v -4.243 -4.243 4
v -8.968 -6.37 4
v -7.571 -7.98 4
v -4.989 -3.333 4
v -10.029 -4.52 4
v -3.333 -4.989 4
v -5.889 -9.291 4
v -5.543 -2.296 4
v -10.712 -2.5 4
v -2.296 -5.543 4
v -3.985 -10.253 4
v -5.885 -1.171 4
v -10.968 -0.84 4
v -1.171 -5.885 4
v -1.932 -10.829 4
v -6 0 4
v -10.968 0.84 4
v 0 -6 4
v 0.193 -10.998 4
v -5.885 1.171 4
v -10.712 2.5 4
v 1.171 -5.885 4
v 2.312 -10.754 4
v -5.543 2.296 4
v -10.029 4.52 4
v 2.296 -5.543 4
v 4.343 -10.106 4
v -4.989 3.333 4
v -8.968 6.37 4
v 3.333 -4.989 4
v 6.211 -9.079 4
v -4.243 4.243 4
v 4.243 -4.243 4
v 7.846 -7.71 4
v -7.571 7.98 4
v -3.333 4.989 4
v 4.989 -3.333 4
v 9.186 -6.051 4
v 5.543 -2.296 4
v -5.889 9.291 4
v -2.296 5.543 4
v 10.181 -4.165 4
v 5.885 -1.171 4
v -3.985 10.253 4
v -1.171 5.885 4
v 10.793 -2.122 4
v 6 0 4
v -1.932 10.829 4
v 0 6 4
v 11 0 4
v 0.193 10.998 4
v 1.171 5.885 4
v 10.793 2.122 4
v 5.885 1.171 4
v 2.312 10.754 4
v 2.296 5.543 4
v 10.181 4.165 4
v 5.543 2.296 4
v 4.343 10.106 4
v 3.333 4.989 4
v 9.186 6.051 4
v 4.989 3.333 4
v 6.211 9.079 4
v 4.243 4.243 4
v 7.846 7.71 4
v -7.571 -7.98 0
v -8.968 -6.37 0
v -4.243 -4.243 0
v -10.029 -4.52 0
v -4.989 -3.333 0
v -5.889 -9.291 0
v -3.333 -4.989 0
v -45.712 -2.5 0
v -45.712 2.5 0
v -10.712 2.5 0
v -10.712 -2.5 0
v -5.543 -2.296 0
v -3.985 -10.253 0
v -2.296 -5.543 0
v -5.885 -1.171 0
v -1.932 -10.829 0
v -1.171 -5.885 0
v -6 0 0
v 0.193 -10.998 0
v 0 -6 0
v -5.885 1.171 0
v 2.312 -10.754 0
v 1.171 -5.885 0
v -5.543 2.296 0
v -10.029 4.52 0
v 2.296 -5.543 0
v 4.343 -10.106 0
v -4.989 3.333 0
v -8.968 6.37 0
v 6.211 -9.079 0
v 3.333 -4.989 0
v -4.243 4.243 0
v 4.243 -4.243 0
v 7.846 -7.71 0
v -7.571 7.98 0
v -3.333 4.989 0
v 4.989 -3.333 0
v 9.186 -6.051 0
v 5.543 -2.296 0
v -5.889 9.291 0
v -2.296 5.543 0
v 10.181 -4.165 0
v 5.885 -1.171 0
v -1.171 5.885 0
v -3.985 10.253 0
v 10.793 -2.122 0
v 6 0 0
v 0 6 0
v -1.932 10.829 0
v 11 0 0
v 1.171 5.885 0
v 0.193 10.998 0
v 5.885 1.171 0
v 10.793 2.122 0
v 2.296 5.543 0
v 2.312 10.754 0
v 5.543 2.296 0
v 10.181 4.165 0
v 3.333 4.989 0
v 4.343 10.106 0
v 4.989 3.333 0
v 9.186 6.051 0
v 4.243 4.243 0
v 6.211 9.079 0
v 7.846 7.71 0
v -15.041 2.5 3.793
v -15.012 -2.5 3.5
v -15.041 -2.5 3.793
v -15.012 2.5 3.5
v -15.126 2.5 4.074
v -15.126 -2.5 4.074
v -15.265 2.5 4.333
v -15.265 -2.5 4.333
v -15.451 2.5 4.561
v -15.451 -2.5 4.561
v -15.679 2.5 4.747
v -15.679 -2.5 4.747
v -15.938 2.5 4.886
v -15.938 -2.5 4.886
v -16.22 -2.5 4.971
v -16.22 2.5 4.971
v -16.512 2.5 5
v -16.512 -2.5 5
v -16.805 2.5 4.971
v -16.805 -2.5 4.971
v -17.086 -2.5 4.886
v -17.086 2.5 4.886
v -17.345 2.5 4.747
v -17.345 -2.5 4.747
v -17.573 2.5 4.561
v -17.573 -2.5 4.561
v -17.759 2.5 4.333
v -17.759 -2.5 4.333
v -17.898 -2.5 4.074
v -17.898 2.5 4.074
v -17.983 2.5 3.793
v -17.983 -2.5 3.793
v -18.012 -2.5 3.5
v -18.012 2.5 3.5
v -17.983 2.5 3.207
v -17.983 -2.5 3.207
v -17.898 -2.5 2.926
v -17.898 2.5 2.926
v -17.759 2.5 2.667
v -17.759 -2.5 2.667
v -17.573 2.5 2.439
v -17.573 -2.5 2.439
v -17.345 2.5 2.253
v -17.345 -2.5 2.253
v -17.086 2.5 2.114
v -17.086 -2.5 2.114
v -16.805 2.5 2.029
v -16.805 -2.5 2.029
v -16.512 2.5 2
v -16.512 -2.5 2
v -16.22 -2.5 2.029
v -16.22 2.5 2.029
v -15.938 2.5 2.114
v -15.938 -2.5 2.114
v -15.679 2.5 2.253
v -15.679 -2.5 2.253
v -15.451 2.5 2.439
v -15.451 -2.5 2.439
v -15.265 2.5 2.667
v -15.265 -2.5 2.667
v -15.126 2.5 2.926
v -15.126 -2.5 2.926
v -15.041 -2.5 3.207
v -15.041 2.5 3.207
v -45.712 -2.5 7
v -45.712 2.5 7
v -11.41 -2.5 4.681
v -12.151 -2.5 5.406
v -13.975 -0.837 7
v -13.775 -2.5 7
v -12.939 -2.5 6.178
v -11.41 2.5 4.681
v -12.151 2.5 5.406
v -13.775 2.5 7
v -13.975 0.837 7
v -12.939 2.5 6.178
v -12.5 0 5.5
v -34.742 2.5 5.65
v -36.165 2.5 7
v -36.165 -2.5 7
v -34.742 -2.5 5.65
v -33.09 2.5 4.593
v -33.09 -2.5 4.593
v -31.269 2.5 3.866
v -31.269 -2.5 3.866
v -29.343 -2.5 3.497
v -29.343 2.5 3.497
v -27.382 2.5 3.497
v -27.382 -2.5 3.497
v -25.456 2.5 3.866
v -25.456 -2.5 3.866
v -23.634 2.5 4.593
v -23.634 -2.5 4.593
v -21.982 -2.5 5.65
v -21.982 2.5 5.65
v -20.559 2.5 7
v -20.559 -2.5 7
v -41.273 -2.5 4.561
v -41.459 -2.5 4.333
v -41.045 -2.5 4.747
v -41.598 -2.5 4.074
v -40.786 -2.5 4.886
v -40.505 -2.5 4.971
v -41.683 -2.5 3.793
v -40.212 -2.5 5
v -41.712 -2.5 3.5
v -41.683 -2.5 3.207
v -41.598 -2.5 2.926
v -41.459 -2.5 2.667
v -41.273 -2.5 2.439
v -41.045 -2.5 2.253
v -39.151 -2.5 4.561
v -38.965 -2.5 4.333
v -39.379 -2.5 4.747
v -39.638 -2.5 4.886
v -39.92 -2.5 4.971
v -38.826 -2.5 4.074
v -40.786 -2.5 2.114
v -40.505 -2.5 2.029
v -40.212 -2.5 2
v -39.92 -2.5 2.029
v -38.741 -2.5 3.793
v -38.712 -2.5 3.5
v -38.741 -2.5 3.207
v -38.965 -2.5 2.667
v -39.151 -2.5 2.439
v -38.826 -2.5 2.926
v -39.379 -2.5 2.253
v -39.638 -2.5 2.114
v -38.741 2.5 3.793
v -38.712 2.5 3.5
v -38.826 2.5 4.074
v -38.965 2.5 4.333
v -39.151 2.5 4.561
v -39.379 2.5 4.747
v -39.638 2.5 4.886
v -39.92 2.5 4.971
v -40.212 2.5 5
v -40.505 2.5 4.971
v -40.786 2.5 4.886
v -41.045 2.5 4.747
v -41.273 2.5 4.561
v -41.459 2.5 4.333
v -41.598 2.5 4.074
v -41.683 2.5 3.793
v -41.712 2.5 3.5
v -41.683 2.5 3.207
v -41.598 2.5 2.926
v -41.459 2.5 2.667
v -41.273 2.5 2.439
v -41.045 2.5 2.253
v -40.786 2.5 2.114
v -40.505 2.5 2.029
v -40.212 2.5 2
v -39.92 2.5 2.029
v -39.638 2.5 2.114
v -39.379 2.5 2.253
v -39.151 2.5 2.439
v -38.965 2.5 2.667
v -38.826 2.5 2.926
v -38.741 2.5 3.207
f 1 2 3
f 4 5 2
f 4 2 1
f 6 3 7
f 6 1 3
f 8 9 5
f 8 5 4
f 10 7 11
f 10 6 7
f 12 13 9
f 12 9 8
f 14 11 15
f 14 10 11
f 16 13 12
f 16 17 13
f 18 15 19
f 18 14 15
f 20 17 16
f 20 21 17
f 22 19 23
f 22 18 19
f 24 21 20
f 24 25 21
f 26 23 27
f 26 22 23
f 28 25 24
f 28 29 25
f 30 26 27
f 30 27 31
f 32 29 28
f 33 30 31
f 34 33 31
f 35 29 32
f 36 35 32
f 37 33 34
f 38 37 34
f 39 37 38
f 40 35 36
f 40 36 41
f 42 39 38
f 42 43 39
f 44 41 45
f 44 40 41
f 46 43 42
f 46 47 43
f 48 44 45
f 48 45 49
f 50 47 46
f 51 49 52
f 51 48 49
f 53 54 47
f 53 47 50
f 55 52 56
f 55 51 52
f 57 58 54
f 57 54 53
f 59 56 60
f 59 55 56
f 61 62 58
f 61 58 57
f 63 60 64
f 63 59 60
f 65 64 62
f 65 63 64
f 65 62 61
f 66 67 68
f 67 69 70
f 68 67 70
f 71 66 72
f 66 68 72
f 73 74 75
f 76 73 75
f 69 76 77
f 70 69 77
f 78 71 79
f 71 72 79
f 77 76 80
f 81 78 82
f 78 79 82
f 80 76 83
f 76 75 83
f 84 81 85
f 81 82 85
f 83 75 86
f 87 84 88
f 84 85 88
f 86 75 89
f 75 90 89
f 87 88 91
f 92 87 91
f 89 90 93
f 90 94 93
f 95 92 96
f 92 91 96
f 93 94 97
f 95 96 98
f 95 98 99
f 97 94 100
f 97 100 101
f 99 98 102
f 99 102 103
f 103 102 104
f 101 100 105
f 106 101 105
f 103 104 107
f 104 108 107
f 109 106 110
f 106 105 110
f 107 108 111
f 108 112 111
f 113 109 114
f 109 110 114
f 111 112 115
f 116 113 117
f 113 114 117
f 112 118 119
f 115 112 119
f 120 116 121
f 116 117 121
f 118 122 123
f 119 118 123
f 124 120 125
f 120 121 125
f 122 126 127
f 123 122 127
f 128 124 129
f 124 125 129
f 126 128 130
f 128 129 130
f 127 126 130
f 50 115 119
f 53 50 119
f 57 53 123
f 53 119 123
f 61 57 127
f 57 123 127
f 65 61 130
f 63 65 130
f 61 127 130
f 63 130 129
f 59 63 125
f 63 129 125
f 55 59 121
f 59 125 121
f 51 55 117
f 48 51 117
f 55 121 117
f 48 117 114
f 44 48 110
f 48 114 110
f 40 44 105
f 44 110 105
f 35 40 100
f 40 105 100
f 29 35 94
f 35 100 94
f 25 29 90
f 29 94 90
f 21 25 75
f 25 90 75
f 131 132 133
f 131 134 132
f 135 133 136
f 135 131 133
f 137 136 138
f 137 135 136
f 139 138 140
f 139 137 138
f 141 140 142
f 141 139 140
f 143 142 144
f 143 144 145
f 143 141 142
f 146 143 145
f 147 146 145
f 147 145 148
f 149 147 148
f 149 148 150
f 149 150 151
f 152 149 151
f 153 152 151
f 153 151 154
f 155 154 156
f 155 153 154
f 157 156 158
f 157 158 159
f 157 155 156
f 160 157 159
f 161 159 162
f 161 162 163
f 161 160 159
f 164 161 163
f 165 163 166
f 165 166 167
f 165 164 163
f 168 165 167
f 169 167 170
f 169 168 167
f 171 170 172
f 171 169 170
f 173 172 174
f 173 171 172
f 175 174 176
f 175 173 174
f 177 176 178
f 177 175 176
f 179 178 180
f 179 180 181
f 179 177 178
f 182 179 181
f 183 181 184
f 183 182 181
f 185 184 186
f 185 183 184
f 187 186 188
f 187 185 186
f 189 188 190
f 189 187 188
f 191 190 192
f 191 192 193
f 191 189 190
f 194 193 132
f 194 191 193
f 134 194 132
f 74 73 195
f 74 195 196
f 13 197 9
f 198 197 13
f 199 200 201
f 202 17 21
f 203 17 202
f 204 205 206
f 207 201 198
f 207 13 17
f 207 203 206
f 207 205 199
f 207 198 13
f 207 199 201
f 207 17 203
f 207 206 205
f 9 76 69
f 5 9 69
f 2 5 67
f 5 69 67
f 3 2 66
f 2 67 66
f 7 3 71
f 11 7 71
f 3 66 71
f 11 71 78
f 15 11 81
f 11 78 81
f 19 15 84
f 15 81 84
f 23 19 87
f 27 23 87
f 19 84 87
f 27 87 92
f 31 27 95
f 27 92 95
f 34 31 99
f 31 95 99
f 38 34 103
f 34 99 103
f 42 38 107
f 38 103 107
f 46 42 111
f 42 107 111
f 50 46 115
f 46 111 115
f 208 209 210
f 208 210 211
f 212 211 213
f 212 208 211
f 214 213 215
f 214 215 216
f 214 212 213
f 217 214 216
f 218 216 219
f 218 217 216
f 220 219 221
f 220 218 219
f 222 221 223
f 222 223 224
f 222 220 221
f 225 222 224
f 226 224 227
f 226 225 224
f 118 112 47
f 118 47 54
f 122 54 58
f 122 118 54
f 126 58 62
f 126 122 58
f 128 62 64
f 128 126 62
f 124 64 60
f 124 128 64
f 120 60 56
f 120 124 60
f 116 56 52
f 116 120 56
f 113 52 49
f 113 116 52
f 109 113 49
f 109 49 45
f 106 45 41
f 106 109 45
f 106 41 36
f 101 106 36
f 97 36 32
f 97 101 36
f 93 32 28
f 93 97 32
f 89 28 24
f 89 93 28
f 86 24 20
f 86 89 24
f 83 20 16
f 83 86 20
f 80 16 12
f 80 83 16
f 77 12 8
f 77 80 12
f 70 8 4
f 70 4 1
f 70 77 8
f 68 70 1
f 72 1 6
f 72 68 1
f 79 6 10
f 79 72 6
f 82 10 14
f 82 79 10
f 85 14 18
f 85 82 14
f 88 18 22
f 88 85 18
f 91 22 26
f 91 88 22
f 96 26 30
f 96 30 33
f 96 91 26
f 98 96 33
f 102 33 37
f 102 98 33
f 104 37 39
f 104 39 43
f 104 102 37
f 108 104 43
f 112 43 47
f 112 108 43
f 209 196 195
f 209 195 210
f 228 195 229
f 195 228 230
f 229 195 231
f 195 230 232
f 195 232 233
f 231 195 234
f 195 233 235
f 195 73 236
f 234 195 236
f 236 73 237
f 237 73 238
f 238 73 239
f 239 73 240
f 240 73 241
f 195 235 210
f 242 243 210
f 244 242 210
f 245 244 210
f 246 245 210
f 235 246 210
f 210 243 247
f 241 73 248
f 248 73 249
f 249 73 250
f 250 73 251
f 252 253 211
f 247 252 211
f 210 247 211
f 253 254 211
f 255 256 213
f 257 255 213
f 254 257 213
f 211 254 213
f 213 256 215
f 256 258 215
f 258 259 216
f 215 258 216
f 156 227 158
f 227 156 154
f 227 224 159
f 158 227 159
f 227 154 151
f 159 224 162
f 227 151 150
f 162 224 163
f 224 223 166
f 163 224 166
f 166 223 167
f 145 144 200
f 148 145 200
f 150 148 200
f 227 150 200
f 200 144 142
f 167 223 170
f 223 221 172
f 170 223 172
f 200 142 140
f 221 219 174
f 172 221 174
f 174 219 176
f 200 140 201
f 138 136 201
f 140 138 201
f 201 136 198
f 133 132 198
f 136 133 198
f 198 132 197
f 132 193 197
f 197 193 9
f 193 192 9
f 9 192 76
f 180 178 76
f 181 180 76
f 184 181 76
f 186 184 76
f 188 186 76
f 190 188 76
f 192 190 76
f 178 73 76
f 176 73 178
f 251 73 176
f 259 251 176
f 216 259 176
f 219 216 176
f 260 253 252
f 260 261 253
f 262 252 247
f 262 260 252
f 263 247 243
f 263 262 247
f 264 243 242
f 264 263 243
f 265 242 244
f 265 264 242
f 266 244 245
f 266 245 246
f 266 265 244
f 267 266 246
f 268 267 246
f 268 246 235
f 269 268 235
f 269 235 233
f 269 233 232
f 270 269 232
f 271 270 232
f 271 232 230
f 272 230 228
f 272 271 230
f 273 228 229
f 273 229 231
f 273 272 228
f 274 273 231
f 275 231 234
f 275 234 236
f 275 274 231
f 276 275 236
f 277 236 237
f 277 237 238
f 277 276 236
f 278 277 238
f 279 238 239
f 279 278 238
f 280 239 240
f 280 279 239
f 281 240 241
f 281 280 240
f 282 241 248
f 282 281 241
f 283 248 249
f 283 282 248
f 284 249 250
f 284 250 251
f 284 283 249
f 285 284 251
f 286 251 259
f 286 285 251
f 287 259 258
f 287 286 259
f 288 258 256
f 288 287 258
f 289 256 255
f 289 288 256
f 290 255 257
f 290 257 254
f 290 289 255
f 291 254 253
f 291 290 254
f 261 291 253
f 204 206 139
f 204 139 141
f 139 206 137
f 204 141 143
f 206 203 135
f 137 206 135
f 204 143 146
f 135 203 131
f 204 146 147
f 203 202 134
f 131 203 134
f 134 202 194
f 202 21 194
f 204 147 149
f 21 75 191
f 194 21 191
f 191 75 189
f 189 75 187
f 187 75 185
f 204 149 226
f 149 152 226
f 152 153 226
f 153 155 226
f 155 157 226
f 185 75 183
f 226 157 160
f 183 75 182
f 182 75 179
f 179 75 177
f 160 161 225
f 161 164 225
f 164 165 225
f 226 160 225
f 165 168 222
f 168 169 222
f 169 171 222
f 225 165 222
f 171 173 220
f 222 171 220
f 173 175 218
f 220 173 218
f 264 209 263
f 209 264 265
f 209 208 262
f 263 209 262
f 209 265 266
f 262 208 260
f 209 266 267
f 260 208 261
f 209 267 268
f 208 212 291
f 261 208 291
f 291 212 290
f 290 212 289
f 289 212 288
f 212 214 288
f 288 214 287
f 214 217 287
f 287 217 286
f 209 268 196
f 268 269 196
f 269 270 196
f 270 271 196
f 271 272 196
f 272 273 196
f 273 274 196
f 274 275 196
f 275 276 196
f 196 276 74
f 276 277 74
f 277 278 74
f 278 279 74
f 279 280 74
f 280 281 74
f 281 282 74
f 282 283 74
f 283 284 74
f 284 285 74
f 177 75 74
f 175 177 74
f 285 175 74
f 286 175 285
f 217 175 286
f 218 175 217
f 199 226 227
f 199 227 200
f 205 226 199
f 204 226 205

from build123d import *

# Parameters (mm, degrees)
F0_R     = 6
F1_DEPTH = 4
F0_W     = 1.5
F0_H     = 5
F0_W_2   = 10.35
F0_W_3   = 4
F2_DEPTH = 7
F6_SIZE  = 2.99999


# Not quite as in the source:
# - a fillet or chamfer is up to 0.001 mm smaller than in the source, because OpenCascade refuses the exact size


with BuildPart() as f1:
    # F0 (on Top) → F1 (new body)
    with BuildSketch(Plane.XY):
        with BuildLine():
            ThreePointArc((-10.7121426428, -2.5), (1.258258902, -10.9277987049), (11, 0))
            ThreePointArc((11, 0), (1.258258902, 10.9277987049), (-10.7121426428, 2.5))
            ThreePointArc((-10.7121426428, 2.5), (-11, 0), (-10.7121426428, -2.5))
        make_face()
        Circle(F0_R, mode=Mode.SUBTRACT)
    extrude(amount=F1_DEPTH)

    # F0 (on Top) → F2 (join)
    with BuildSketch(Plane.XY):
        with BuildLine():
            ThreePointArc((-10.7121426428, -2.5), (-11, 0), (-10.7121426428, 2.5))
            Line((-10.7121426428, 2.5), (-15.0121426428, 2.5))
            Line((-15.0121426428, 2.5), (-15.0121426428, -2.5))
            Line((-15.0121426428, -2.5), (-10.7121426428, -2.5))
        make_face()
        with Locations((-15.7621426428, 0)):
            Rectangle(F0_W, F0_H)
        with Locations((-17.2621426428, 0)):
            Rectangle(F0_W, F0_H)
        with Locations((-33.5371426428, 0)):
            Rectangle(F0_W_2, F0_H)
        with Locations((-39.4621426428, 0)):
            Rectangle(F0_W, F0_H)
        with Locations((-40.9621426428, 0)):
            Rectangle(F0_W, F0_H)
        with Locations((-43.7121426428, 0)):
            Rectangle(F0_W_3, F0_H)
        with Locations((-23.1871426428, 0)):
            Rectangle(F0_W_2, F0_H)
    extrude(amount=F2_DEPTH)

    # F6 (size 3 in the source; OpenCascade refuses exactly that, so slightly less here)
    f6_edges = [f1.edges().sort_by_distance(p)[0] for p in [
        (-11, 0, 7),
    ]]
    chamfer(f6_edges, length=F6_SIZE)


with BuildPart() as f3:
    # F0 (on Top) → F3 (revolve)
    with BuildSketch(Plane.XY):
        with Locations((-15.7621426428, 0)):
            Rectangle(F0_W, F0_H)
    revolve(axis=Axis((-16.5121426428, 0, 0), (0, -1, 0)))


with BuildPart() as f4:
    # F0 (on Top) → F4 (revolve)
    with BuildSketch(Plane.XY):
        with Locations((-39.4621426428, 0)):
            Rectangle(F0_W, F0_H)
    revolve(axis=Axis((-40.2121426428, 0, 0), (0, -1, 0)))


with BuildPart() as f4_1:
    # F5: moved
    add(f4.part.moved(Location((0, 0, 3.5))))


with BuildPart() as f3_1:
    # F5: moved
    add(f3.part.moved(Location((0, 0, 3.5))))


with BuildPart() as f7:
    # F0 (on Top) → F7 (revolve)
    with BuildSketch(Plane.XY):
        with Locations((-23.1871426428, 0)):
            Rectangle(F0_W_2, F0_H)
    revolve(axis=Axis((-28.3621426428, 0, 0), (0, -1, 0)))


with BuildPart() as f7_1:
    # F8: moved
    add(f7.part.moved(Location((0, 0, 13.8))))


with BuildPart() as f1_1:
    add(f1.part)

    # F9: cut F4, F7, F3
    add(f4_1.part, mode=Mode.SUBTRACT)
    add(f7_1.part, mode=Mode.SUBTRACT)
    add(f3_1.part, mode=Mode.SUBTRACT)


solid = f1_1.part
